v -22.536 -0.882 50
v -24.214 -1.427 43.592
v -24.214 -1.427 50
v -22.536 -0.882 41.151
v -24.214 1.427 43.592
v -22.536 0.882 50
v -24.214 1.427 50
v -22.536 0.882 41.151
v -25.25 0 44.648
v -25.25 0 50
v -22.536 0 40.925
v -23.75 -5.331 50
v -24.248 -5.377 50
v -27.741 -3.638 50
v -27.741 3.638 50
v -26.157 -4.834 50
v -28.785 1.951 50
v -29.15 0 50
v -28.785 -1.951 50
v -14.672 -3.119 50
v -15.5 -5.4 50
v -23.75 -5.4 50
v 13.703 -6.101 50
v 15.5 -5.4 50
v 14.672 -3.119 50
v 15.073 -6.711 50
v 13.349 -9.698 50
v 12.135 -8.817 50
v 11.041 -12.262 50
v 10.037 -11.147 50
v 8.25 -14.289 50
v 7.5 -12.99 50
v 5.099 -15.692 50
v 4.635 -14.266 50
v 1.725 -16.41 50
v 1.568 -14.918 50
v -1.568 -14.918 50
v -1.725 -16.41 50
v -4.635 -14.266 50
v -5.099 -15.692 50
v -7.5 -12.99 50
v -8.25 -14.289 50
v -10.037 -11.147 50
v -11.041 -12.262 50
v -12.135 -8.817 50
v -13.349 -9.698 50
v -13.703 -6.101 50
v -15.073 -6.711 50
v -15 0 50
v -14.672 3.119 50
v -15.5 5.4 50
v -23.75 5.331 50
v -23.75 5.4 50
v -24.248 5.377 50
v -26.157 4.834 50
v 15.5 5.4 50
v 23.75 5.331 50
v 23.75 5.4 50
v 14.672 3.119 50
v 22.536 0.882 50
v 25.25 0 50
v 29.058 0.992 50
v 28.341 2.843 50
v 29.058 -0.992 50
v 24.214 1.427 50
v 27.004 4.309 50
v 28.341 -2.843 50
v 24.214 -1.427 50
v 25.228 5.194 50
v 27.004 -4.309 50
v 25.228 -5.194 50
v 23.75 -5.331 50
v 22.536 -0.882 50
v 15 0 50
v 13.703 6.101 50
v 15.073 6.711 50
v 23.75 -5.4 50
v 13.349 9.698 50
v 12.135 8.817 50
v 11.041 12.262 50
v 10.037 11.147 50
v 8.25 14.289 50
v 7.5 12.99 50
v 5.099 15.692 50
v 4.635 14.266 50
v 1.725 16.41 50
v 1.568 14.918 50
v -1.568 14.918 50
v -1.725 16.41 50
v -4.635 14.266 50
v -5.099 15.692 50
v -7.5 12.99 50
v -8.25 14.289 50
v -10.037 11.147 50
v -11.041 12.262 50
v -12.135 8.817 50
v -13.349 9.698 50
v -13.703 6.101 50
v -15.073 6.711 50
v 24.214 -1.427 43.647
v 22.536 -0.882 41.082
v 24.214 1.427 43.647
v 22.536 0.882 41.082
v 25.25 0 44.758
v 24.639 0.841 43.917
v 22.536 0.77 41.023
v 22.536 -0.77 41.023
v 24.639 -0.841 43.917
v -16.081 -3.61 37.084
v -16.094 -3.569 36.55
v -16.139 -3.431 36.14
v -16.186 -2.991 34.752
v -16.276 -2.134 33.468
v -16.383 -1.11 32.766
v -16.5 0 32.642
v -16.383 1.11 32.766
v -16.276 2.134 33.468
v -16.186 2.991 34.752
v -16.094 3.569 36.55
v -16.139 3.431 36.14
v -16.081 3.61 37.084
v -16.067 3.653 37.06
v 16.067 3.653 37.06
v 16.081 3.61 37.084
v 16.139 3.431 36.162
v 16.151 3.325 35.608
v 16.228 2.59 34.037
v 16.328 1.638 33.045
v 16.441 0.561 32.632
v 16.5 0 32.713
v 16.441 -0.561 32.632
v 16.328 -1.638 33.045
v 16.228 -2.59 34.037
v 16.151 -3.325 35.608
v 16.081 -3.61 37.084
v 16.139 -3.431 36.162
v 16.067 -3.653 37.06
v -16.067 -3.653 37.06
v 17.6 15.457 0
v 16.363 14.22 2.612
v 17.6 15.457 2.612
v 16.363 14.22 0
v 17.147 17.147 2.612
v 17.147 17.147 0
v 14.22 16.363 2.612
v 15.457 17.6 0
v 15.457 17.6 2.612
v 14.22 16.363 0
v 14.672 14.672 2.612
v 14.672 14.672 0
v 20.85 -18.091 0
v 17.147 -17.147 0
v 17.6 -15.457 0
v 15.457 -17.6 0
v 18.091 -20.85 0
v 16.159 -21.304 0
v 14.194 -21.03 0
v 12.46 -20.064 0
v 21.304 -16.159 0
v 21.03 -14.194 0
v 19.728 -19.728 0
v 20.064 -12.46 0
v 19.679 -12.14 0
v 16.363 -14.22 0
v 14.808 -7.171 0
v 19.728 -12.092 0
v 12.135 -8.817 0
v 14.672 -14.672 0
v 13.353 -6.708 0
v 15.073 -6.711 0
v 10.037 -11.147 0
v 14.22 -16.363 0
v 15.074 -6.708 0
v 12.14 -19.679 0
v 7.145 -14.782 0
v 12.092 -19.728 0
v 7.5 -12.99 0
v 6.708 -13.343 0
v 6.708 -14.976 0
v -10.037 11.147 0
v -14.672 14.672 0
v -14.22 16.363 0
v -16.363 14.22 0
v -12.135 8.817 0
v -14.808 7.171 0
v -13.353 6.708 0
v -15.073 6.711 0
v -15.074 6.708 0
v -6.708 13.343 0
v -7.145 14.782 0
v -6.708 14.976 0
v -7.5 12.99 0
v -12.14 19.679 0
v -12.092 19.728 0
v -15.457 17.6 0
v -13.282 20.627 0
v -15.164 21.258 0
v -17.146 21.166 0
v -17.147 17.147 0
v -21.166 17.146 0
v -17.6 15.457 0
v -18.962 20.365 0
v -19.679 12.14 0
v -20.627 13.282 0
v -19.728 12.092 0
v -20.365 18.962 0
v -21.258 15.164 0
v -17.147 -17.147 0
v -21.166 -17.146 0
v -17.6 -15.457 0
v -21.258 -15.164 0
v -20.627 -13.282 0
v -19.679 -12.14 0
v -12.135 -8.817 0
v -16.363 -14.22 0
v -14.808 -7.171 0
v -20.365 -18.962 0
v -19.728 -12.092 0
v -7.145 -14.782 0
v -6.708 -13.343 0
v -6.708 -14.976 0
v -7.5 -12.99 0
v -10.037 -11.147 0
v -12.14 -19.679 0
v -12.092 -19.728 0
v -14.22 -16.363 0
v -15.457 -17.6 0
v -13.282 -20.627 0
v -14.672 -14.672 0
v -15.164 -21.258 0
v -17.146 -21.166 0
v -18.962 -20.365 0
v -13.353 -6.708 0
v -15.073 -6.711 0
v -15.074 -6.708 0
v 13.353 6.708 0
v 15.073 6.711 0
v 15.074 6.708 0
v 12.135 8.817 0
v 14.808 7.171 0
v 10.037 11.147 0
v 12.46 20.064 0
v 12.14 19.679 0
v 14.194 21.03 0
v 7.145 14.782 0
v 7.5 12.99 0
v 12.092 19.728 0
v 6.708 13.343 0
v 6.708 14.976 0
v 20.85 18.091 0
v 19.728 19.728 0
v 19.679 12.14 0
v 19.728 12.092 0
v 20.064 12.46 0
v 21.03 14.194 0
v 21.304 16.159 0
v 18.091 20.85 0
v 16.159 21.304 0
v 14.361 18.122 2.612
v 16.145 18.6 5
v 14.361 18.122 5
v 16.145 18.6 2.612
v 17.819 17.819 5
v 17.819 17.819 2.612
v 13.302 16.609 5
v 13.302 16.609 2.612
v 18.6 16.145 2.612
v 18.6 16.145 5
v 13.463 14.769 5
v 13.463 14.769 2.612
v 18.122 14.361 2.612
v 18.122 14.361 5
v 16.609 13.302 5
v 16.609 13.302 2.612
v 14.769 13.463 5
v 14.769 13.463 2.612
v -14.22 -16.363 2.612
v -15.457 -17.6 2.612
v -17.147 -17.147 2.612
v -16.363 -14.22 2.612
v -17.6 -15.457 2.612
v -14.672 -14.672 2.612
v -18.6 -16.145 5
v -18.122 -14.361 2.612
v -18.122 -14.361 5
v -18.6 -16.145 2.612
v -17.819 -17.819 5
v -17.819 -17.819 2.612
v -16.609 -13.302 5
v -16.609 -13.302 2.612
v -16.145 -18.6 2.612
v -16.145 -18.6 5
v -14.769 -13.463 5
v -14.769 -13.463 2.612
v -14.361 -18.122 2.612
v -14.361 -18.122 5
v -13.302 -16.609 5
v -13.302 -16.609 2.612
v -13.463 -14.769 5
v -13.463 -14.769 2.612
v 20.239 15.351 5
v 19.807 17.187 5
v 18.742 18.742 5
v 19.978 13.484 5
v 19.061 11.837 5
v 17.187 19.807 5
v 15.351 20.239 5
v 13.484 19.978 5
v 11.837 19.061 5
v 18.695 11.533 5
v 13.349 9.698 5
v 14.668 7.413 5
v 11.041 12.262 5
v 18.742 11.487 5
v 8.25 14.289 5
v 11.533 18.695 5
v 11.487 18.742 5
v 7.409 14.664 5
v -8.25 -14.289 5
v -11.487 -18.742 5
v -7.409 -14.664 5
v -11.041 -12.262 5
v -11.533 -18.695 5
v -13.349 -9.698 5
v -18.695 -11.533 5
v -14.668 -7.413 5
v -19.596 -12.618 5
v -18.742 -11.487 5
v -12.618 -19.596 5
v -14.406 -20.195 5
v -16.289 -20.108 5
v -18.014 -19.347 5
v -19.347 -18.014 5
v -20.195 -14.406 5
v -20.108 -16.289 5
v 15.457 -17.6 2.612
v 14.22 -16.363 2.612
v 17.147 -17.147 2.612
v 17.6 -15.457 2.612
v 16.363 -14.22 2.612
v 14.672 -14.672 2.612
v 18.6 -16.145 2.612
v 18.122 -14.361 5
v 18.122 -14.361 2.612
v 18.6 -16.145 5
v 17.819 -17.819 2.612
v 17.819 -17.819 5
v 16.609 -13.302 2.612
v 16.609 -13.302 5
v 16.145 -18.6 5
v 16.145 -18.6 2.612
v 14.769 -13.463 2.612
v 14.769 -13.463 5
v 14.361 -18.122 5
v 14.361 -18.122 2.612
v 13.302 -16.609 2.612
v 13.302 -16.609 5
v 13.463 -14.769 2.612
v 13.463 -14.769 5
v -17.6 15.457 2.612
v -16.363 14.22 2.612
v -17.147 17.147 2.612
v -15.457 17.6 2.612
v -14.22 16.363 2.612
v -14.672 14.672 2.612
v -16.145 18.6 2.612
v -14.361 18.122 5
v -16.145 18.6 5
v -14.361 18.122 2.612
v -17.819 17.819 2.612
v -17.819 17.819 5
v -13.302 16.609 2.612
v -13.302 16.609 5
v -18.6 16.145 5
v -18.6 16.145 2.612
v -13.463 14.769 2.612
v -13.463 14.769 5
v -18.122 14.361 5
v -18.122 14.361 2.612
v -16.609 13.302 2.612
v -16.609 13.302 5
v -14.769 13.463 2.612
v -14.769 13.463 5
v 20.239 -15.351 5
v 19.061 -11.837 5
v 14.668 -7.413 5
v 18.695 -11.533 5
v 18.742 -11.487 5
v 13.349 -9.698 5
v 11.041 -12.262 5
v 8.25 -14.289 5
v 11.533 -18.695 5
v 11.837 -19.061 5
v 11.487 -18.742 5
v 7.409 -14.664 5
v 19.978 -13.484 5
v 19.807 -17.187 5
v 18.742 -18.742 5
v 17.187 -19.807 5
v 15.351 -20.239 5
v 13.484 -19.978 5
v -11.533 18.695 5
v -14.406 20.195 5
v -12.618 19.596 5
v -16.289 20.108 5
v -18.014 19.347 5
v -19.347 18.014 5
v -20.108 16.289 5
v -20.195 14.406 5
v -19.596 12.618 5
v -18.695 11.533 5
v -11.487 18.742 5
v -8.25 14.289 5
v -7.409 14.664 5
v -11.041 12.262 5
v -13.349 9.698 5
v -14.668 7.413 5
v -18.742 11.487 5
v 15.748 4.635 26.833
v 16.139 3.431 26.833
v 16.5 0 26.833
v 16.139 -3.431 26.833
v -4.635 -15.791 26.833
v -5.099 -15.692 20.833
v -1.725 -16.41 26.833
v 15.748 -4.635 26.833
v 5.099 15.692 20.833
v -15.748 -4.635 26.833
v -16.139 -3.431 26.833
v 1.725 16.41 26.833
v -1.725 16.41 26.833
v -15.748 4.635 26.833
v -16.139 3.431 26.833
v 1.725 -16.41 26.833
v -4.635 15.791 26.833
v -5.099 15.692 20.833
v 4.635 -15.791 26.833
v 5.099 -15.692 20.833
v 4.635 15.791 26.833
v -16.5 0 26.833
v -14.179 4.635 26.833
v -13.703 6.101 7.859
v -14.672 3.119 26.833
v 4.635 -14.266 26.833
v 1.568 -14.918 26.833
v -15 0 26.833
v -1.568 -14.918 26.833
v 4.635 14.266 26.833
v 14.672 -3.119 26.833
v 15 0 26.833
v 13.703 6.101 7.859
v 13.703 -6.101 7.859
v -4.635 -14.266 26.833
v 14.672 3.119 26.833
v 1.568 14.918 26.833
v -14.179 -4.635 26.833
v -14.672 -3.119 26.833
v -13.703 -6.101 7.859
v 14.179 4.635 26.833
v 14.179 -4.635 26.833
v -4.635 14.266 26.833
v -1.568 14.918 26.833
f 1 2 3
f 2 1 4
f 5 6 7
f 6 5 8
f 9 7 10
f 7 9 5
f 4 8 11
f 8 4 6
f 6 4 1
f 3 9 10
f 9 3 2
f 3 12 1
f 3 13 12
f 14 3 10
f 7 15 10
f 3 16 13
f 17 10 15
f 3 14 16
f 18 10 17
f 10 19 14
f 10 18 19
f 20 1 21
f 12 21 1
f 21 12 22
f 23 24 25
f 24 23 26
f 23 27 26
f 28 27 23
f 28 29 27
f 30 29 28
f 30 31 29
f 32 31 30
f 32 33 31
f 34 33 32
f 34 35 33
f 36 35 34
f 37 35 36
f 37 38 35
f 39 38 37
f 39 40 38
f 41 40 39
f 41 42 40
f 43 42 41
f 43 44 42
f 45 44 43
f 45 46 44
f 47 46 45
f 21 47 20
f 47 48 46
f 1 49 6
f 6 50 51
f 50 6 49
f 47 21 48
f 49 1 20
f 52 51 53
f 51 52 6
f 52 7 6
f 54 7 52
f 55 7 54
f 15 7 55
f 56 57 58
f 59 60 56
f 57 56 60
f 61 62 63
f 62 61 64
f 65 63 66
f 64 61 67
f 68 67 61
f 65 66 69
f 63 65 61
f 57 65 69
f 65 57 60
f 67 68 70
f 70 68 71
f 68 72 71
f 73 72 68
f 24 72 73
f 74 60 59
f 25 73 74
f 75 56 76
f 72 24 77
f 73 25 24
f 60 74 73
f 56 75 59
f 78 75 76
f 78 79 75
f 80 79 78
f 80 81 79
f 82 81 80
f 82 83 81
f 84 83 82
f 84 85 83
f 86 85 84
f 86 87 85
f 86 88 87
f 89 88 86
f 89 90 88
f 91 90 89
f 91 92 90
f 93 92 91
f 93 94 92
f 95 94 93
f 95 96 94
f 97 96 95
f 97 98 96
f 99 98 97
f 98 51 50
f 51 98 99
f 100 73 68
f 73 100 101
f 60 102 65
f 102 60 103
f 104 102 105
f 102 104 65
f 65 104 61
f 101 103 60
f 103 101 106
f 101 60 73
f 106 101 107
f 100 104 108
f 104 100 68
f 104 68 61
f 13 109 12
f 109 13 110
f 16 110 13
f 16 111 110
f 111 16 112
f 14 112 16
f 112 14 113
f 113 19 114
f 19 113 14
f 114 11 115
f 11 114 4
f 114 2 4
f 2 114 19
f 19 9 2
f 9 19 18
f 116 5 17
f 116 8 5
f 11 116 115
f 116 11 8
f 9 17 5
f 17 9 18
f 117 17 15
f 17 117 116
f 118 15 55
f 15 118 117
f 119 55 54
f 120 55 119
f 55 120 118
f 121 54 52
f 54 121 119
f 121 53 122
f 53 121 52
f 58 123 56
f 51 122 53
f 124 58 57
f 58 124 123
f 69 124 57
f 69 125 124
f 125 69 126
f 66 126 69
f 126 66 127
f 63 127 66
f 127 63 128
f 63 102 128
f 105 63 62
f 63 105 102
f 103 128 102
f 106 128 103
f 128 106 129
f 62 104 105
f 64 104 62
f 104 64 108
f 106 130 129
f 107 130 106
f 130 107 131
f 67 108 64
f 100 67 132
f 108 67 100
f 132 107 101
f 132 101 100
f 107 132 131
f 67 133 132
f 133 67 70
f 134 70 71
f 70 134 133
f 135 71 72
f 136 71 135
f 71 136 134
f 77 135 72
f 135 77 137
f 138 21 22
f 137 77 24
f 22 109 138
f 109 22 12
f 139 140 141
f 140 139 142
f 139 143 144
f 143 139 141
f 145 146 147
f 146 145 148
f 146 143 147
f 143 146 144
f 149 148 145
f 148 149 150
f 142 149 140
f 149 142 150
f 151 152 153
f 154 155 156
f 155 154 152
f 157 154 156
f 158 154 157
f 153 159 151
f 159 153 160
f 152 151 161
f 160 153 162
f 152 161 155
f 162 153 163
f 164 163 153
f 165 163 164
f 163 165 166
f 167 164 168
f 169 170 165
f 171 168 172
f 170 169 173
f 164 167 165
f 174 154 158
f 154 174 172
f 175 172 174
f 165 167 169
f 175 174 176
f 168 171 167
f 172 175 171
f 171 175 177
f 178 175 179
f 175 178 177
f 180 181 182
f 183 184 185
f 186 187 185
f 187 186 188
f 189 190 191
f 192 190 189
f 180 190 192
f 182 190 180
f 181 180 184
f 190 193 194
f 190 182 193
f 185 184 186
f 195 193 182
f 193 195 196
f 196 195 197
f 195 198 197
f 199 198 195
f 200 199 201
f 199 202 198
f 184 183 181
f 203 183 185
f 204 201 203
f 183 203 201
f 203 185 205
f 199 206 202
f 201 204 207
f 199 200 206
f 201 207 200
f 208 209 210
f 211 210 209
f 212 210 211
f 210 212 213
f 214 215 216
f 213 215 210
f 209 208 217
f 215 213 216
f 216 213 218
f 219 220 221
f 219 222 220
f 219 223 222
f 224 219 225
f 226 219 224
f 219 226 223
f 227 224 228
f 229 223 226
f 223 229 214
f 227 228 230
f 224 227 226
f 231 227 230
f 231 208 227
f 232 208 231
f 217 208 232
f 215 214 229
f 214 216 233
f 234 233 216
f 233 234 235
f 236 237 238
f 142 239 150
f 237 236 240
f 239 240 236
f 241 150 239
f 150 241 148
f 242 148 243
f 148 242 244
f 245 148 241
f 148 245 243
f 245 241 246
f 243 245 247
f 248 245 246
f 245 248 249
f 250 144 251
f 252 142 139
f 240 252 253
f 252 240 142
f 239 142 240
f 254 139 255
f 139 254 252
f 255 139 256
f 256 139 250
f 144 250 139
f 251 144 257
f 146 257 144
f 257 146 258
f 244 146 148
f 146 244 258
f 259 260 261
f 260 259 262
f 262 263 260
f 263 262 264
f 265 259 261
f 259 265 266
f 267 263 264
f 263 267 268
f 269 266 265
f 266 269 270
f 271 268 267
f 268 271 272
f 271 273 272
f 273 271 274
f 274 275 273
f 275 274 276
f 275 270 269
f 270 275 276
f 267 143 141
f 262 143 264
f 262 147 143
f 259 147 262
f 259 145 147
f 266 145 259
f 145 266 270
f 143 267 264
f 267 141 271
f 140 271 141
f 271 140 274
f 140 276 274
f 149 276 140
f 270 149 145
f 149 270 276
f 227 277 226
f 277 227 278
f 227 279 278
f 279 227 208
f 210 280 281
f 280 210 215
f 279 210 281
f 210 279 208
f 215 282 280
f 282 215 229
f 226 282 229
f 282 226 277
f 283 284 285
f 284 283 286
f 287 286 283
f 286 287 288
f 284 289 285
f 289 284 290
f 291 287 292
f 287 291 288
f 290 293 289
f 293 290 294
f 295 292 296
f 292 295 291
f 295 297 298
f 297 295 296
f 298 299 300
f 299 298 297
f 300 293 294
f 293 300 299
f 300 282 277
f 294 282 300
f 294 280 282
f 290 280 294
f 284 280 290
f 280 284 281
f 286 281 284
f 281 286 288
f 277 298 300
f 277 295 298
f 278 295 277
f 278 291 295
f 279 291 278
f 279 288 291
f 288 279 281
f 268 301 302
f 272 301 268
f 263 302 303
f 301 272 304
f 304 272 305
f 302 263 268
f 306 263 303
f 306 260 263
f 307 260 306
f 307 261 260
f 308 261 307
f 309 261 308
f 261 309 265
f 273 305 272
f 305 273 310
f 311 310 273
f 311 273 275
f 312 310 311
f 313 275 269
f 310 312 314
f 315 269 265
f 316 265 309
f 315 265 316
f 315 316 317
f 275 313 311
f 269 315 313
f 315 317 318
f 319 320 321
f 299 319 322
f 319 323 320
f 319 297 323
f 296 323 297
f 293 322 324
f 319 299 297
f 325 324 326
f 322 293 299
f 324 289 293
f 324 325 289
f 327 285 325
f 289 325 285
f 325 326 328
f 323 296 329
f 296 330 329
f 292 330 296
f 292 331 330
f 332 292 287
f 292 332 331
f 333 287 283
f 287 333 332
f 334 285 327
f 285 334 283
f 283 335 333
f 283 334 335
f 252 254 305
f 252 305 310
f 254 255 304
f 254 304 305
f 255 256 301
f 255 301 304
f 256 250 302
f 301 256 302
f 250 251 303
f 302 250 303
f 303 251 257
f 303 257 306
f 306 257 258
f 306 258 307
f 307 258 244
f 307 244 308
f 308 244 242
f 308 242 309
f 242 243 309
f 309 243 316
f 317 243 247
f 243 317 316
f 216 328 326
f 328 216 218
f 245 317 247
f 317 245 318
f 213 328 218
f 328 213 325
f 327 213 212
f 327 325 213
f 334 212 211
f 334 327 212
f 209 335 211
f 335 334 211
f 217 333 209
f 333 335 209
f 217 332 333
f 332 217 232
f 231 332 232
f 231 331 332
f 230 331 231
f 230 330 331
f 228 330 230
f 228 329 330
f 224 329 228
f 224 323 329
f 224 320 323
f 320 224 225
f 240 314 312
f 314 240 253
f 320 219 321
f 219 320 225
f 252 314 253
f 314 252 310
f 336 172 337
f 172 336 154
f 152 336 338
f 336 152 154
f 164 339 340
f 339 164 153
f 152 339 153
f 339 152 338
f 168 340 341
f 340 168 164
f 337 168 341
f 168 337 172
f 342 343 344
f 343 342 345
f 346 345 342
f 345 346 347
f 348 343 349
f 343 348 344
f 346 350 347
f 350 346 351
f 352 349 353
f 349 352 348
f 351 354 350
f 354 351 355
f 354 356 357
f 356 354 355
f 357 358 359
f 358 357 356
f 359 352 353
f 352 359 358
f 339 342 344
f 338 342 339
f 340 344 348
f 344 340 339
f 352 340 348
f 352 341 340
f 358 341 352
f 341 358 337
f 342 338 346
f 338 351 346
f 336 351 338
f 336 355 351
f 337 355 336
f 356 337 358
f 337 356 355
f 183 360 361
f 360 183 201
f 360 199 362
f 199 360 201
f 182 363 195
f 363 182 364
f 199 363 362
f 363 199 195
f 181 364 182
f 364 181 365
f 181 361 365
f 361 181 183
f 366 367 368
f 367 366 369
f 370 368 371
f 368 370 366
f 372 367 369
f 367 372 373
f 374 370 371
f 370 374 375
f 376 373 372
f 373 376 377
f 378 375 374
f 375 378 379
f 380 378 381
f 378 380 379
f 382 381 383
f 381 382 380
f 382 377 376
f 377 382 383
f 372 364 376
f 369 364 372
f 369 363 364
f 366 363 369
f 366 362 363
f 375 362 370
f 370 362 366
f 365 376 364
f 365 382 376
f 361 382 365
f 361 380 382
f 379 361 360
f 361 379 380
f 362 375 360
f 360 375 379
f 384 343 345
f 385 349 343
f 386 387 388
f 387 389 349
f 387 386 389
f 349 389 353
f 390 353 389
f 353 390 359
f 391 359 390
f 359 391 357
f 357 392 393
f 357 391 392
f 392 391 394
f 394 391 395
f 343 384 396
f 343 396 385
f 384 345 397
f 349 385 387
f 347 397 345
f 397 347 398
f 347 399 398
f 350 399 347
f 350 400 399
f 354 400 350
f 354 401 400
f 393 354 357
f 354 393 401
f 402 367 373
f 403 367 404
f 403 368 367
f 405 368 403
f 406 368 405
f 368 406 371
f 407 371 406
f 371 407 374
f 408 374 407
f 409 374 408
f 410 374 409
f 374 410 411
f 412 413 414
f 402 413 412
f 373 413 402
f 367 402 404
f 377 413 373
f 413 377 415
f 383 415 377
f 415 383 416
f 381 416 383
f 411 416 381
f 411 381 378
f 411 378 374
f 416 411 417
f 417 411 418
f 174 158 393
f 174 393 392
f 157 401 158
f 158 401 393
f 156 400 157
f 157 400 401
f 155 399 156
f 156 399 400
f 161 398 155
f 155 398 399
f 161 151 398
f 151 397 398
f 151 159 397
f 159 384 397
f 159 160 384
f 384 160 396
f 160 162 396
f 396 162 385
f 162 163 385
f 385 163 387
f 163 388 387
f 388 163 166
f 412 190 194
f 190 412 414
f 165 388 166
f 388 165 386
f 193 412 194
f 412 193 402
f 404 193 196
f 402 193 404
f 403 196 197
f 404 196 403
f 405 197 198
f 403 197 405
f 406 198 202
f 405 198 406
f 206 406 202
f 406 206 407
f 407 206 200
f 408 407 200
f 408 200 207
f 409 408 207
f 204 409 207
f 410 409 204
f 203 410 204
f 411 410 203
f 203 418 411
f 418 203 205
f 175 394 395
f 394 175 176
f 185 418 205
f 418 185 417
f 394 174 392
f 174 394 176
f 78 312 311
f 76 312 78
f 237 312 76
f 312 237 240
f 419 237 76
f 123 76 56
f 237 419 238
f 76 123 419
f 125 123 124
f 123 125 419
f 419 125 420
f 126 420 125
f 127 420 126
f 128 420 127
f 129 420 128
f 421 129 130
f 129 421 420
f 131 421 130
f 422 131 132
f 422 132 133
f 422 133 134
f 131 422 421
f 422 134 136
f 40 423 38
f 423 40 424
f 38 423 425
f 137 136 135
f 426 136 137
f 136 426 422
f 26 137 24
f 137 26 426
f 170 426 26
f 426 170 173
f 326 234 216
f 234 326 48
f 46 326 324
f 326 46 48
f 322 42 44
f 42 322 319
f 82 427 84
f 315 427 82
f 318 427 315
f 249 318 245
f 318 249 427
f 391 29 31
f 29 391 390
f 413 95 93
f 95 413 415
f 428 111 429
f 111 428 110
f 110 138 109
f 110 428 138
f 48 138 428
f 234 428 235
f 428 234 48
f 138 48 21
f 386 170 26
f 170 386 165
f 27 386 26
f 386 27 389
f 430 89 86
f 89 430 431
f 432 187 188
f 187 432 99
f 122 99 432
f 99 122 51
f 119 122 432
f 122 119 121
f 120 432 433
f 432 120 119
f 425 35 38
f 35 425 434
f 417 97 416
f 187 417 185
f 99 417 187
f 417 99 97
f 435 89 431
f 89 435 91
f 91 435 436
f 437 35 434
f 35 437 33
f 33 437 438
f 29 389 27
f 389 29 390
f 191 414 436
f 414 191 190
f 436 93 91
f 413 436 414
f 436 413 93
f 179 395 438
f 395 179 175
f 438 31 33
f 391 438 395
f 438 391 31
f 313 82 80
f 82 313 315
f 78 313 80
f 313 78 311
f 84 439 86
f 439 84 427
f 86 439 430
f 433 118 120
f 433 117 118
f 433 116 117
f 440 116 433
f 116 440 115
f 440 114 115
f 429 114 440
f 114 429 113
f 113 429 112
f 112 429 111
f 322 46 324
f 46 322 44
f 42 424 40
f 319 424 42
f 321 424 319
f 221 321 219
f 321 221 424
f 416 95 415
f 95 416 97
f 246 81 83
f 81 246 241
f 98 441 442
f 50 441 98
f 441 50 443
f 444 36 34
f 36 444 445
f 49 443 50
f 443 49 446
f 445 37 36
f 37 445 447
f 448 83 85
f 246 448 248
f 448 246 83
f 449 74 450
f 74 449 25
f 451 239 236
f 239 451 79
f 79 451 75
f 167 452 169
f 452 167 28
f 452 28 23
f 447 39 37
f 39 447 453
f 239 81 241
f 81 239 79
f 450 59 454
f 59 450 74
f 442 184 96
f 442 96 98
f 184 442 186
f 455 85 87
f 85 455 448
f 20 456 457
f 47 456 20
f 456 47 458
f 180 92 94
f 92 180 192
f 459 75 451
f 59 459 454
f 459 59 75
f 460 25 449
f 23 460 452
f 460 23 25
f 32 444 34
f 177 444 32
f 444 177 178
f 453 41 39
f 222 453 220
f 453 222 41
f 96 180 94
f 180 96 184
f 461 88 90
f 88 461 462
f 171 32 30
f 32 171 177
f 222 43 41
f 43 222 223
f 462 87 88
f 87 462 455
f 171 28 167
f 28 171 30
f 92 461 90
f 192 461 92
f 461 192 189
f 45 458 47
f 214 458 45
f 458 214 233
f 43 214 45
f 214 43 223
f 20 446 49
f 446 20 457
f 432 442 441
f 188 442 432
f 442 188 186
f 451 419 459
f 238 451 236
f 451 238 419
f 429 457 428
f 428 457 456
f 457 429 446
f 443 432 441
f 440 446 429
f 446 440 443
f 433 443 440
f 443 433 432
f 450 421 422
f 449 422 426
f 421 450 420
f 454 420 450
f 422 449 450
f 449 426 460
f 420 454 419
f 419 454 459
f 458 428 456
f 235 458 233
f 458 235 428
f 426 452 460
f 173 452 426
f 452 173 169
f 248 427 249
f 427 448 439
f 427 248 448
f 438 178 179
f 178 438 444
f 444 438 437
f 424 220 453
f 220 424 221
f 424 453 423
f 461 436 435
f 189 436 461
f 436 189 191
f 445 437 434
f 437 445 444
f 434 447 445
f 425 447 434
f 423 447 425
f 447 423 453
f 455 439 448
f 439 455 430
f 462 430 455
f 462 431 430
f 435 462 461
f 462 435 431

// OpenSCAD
// file: lib/peristaltic_pump_mount.scad
/**
 * @file peristaltic_pump_mount.scad
 * @brief Peristaltic pump mount
 * @author Cameron K. Brooks
 * @copyright 2025
 *
 * This file contains a mount for holding and fixing a peristaltic pump in place by its base. The mount is
 * derived/inspired by a model found on printables.com: https://www.printables.com/model/857120-peristaltic-pump-mount.
 * Notable changes include the addition of a z-fighting avoidance, modularization, documentation/readability, and a
 * reduction in the number of parameters.
 */

zFite = $preview ? 0.1 : 0; // z-fighting avoidance for preview

/**
 * @brief Generates a mount for holding and fixing a peristaltic pump in place by its base.
 *
 * @param inner_diameter The inner diameter of the body.
 * @param outer_diameter The outer diameter of the body.
 * @param body_height The height of the body.
 * @param base_mount_height The height of the base mount.
 * @param base_mount_scale The scale of the base mount taper.
 * @param pump_mount_height The height of the pump mount.
 * @param pump_mount_scale The scale of the pump mount taper.
 * @param mount_width The width of the mounting bars.
 * @param base_bore_distance The distance between the screw holes on the base of the pump.
 * @param pump_thread_diameter The diameter of the screw thread on the base of the pump.
 * @param pump_bore_diatance The distance between the screw holes on the faceplate of the pump.
 * @param base_thread_diameter The diameter of the screw thread on the base of the pump.
 * @param base_head_diameter The diameter of the screw head on the base of the pump.
 * @param body_opening The opening of the body.
 */
module peri_mount(inner_diameter, outer_diameter, body_height, base_mount_height, base_mount_scale, pump_mount_height,
                  pump_mount_scale, mount_width, base_bore_distance, pump_thread_diameter, pump_bore_diatance,
                  base_thread_diameter, base_head_diameter, body_opening = undef)
{
    body_opening = is_undef(body_opening) ? [ inner_diameter, inner_diameter, outer_diameter ] : body_opening;
    difference()
    {
        union()
        {
            // body
            cylinder(d = outer_diameter, h = body_height);

            // pump mounts
            translate([ 0, 0, body_height ]) rotate([ 0, 180, 0 ])
                mounts(pump_mount_height, pump_thread_diameter, pump_thread_diameter, pump_bore_diatance, mount_width,
                       pump_mount_scale);
            // base mounts
            rotate([ 0, 0, 45 ])
            {
                mounts(base_mount_height, base_thread_diameter, base_head_diameter, base_bore_distance, mount_width,
                       base_mount_scale);
            }
            rotate([ 0, 0, -45 ])
            {
                mounts(base_mount_height, base_thread_diameter, base_head_diameter, base_bore_distance, mount_width,
                       base_mount_scale);
            }
        }

        // body_opening in the middle
        translate([ 0, 0, -zFite / 2 ]) cylinder(d = inner_diameter, h = body_height + zFite);

        // body_opening on the sides
        rotate([ 0, 90, 0 ]) resize(body_opening)
        {
            cylinder(d = body_opening, h = outer_diameter, center = true);
        }
        rotate([ 0, 90, 90 ]) resize(body_opening)
        {
            cylinder(d = body_opening, h = outer_diameter, center = true);
        }
    }
}

/**
 * @brief Generates a mount for holding and fixing the pump to the holder and the holder to the mount surface.
 *
 * @param mount_height The height of the mount.
 * @param bore1 The diameter of the first bore hole.
 * @param bore2 The diameter of the second bore hole.
 * @param base_bore_distance The distance between the bore holes.
 * @param mount_width The width of the mounting bars.
 * @param scale The scale of the mount taper.
 */
module mounts(mount_height, bore1, bore2, base_bore_distance, mount_width, scale = 1)
{
    bore2Ratio = -0.45 * scale + 0.95;
    difference()
    {
        // mounts
        linear_extrude(height = mount_height, scale = scale) union()
        {
            translate([ base_bore_distance / 2, 0, 0 ]) circle(d = mount_width);
            translate([ -base_bore_distance / 2, 0, 0 ]) circle(d = mount_width);
            square([ base_bore_distance, mount_width ], center = true);
        }

        // bore holes
        for (i = [0:1])
        {
            mirror([ i, 0, 0 ]) translate([ base_bore_distance / 2, 0, -zFite / 2 ]) union()
            {
                cylinder(d = bore1, h = mount_height + zFite);
                translate([ 0, 0, mount_height * bore2Ratio + zFite ])
                {
                    cylinder(d = bore2, h = mount_height * bore2Ratio + zFite);
                }
            }
        }
    }
}
// main file
use <lib/peristaltic_pump_mount.scad>;

peri_mount_thickness =
    3; // thickness of the body; this is largely arbitrary just dont make it too thin or it will be weak
// and too thick and it will be heavy/wasteful
peri_mount_height =
    50; // height of the body; this is the motor body length measured from the faceplate to base with some
// extra to let terminals out
peri_pump_diameter = 30; // inner diameter of the body; this is the measurement of your pumps diameter

// based on the desired attachment point of the pump
peri_base_mount_height = 5;         // height of the base mount
peri_base_screw_distance = 45;      // distance between the screw holes on the base of the pump
peri_base_screwhead_diameter = 5.4; // diameter of the screw head on the base of the pump
peri_base_thread_diameter = 3.5;    // diameter of the screw thread on the base of the pump
peri_base_mount_taper_scale = 0.95; // 1 is no taper (square edges), 0 is a lot of taper (fully smoothed); this is
// superficial and can be changed to your liking

// based on the faceplate of the pump
peri_faceplate_mount_height = 20; // height of the faceplate mount
peri_faceplate_screw_distance = 47.5;
peri_faceplate_thread_diameter = 3;
peri_faceplate_mount_taper_scale =
    0.50; // for printing keep 0.5 - 1 as 0.5 results in 45 degree taper, 1 results in no taper

peri_mounts_width =
    peri_base_screwhead_diameter *
    2; // width of the mounting bars; largely arbitrary, must be greater than mounting holes, ideally 2*screwhead

// Calculated values
peri_mount_outer_diameter =
    peri_pump_diameter + peri_mount_thickness; // outer diameter of the body; this is the outside diameter of the body
peri_mount_opening_dim = (peri_pump_diameter) / 2;
peri_mount_body_opening = [ peri_mount_opening_dim * 4, peri_mount_opening_dim, peri_mount_outer_diameter ];

// Call the module
peri_mount(inner_diameter = peri_pump_diameter, outer_diameter = peri_mount_outer_diameter,
           body_height = peri_mount_height, base_mount_height = peri_base_mount_height,
           base_mount_scale = peri_base_mount_taper_scale, pump_mount_height = peri_faceplate_mount_height,
           pump_mount_scale = peri_faceplate_mount_taper_scale, mount_width = peri_mounts_width,
           base_bore_distance = peri_base_screw_distance, pump_thread_diameter = peri_faceplate_thread_diameter,
           pump_bore_diatance = peri_faceplate_screw_distance, base_thread_diameter = peri_base_thread_diameter,
           base_head_diameter = peri_base_screwhead_diameter, body_opening = peri_mount_body_opening);
